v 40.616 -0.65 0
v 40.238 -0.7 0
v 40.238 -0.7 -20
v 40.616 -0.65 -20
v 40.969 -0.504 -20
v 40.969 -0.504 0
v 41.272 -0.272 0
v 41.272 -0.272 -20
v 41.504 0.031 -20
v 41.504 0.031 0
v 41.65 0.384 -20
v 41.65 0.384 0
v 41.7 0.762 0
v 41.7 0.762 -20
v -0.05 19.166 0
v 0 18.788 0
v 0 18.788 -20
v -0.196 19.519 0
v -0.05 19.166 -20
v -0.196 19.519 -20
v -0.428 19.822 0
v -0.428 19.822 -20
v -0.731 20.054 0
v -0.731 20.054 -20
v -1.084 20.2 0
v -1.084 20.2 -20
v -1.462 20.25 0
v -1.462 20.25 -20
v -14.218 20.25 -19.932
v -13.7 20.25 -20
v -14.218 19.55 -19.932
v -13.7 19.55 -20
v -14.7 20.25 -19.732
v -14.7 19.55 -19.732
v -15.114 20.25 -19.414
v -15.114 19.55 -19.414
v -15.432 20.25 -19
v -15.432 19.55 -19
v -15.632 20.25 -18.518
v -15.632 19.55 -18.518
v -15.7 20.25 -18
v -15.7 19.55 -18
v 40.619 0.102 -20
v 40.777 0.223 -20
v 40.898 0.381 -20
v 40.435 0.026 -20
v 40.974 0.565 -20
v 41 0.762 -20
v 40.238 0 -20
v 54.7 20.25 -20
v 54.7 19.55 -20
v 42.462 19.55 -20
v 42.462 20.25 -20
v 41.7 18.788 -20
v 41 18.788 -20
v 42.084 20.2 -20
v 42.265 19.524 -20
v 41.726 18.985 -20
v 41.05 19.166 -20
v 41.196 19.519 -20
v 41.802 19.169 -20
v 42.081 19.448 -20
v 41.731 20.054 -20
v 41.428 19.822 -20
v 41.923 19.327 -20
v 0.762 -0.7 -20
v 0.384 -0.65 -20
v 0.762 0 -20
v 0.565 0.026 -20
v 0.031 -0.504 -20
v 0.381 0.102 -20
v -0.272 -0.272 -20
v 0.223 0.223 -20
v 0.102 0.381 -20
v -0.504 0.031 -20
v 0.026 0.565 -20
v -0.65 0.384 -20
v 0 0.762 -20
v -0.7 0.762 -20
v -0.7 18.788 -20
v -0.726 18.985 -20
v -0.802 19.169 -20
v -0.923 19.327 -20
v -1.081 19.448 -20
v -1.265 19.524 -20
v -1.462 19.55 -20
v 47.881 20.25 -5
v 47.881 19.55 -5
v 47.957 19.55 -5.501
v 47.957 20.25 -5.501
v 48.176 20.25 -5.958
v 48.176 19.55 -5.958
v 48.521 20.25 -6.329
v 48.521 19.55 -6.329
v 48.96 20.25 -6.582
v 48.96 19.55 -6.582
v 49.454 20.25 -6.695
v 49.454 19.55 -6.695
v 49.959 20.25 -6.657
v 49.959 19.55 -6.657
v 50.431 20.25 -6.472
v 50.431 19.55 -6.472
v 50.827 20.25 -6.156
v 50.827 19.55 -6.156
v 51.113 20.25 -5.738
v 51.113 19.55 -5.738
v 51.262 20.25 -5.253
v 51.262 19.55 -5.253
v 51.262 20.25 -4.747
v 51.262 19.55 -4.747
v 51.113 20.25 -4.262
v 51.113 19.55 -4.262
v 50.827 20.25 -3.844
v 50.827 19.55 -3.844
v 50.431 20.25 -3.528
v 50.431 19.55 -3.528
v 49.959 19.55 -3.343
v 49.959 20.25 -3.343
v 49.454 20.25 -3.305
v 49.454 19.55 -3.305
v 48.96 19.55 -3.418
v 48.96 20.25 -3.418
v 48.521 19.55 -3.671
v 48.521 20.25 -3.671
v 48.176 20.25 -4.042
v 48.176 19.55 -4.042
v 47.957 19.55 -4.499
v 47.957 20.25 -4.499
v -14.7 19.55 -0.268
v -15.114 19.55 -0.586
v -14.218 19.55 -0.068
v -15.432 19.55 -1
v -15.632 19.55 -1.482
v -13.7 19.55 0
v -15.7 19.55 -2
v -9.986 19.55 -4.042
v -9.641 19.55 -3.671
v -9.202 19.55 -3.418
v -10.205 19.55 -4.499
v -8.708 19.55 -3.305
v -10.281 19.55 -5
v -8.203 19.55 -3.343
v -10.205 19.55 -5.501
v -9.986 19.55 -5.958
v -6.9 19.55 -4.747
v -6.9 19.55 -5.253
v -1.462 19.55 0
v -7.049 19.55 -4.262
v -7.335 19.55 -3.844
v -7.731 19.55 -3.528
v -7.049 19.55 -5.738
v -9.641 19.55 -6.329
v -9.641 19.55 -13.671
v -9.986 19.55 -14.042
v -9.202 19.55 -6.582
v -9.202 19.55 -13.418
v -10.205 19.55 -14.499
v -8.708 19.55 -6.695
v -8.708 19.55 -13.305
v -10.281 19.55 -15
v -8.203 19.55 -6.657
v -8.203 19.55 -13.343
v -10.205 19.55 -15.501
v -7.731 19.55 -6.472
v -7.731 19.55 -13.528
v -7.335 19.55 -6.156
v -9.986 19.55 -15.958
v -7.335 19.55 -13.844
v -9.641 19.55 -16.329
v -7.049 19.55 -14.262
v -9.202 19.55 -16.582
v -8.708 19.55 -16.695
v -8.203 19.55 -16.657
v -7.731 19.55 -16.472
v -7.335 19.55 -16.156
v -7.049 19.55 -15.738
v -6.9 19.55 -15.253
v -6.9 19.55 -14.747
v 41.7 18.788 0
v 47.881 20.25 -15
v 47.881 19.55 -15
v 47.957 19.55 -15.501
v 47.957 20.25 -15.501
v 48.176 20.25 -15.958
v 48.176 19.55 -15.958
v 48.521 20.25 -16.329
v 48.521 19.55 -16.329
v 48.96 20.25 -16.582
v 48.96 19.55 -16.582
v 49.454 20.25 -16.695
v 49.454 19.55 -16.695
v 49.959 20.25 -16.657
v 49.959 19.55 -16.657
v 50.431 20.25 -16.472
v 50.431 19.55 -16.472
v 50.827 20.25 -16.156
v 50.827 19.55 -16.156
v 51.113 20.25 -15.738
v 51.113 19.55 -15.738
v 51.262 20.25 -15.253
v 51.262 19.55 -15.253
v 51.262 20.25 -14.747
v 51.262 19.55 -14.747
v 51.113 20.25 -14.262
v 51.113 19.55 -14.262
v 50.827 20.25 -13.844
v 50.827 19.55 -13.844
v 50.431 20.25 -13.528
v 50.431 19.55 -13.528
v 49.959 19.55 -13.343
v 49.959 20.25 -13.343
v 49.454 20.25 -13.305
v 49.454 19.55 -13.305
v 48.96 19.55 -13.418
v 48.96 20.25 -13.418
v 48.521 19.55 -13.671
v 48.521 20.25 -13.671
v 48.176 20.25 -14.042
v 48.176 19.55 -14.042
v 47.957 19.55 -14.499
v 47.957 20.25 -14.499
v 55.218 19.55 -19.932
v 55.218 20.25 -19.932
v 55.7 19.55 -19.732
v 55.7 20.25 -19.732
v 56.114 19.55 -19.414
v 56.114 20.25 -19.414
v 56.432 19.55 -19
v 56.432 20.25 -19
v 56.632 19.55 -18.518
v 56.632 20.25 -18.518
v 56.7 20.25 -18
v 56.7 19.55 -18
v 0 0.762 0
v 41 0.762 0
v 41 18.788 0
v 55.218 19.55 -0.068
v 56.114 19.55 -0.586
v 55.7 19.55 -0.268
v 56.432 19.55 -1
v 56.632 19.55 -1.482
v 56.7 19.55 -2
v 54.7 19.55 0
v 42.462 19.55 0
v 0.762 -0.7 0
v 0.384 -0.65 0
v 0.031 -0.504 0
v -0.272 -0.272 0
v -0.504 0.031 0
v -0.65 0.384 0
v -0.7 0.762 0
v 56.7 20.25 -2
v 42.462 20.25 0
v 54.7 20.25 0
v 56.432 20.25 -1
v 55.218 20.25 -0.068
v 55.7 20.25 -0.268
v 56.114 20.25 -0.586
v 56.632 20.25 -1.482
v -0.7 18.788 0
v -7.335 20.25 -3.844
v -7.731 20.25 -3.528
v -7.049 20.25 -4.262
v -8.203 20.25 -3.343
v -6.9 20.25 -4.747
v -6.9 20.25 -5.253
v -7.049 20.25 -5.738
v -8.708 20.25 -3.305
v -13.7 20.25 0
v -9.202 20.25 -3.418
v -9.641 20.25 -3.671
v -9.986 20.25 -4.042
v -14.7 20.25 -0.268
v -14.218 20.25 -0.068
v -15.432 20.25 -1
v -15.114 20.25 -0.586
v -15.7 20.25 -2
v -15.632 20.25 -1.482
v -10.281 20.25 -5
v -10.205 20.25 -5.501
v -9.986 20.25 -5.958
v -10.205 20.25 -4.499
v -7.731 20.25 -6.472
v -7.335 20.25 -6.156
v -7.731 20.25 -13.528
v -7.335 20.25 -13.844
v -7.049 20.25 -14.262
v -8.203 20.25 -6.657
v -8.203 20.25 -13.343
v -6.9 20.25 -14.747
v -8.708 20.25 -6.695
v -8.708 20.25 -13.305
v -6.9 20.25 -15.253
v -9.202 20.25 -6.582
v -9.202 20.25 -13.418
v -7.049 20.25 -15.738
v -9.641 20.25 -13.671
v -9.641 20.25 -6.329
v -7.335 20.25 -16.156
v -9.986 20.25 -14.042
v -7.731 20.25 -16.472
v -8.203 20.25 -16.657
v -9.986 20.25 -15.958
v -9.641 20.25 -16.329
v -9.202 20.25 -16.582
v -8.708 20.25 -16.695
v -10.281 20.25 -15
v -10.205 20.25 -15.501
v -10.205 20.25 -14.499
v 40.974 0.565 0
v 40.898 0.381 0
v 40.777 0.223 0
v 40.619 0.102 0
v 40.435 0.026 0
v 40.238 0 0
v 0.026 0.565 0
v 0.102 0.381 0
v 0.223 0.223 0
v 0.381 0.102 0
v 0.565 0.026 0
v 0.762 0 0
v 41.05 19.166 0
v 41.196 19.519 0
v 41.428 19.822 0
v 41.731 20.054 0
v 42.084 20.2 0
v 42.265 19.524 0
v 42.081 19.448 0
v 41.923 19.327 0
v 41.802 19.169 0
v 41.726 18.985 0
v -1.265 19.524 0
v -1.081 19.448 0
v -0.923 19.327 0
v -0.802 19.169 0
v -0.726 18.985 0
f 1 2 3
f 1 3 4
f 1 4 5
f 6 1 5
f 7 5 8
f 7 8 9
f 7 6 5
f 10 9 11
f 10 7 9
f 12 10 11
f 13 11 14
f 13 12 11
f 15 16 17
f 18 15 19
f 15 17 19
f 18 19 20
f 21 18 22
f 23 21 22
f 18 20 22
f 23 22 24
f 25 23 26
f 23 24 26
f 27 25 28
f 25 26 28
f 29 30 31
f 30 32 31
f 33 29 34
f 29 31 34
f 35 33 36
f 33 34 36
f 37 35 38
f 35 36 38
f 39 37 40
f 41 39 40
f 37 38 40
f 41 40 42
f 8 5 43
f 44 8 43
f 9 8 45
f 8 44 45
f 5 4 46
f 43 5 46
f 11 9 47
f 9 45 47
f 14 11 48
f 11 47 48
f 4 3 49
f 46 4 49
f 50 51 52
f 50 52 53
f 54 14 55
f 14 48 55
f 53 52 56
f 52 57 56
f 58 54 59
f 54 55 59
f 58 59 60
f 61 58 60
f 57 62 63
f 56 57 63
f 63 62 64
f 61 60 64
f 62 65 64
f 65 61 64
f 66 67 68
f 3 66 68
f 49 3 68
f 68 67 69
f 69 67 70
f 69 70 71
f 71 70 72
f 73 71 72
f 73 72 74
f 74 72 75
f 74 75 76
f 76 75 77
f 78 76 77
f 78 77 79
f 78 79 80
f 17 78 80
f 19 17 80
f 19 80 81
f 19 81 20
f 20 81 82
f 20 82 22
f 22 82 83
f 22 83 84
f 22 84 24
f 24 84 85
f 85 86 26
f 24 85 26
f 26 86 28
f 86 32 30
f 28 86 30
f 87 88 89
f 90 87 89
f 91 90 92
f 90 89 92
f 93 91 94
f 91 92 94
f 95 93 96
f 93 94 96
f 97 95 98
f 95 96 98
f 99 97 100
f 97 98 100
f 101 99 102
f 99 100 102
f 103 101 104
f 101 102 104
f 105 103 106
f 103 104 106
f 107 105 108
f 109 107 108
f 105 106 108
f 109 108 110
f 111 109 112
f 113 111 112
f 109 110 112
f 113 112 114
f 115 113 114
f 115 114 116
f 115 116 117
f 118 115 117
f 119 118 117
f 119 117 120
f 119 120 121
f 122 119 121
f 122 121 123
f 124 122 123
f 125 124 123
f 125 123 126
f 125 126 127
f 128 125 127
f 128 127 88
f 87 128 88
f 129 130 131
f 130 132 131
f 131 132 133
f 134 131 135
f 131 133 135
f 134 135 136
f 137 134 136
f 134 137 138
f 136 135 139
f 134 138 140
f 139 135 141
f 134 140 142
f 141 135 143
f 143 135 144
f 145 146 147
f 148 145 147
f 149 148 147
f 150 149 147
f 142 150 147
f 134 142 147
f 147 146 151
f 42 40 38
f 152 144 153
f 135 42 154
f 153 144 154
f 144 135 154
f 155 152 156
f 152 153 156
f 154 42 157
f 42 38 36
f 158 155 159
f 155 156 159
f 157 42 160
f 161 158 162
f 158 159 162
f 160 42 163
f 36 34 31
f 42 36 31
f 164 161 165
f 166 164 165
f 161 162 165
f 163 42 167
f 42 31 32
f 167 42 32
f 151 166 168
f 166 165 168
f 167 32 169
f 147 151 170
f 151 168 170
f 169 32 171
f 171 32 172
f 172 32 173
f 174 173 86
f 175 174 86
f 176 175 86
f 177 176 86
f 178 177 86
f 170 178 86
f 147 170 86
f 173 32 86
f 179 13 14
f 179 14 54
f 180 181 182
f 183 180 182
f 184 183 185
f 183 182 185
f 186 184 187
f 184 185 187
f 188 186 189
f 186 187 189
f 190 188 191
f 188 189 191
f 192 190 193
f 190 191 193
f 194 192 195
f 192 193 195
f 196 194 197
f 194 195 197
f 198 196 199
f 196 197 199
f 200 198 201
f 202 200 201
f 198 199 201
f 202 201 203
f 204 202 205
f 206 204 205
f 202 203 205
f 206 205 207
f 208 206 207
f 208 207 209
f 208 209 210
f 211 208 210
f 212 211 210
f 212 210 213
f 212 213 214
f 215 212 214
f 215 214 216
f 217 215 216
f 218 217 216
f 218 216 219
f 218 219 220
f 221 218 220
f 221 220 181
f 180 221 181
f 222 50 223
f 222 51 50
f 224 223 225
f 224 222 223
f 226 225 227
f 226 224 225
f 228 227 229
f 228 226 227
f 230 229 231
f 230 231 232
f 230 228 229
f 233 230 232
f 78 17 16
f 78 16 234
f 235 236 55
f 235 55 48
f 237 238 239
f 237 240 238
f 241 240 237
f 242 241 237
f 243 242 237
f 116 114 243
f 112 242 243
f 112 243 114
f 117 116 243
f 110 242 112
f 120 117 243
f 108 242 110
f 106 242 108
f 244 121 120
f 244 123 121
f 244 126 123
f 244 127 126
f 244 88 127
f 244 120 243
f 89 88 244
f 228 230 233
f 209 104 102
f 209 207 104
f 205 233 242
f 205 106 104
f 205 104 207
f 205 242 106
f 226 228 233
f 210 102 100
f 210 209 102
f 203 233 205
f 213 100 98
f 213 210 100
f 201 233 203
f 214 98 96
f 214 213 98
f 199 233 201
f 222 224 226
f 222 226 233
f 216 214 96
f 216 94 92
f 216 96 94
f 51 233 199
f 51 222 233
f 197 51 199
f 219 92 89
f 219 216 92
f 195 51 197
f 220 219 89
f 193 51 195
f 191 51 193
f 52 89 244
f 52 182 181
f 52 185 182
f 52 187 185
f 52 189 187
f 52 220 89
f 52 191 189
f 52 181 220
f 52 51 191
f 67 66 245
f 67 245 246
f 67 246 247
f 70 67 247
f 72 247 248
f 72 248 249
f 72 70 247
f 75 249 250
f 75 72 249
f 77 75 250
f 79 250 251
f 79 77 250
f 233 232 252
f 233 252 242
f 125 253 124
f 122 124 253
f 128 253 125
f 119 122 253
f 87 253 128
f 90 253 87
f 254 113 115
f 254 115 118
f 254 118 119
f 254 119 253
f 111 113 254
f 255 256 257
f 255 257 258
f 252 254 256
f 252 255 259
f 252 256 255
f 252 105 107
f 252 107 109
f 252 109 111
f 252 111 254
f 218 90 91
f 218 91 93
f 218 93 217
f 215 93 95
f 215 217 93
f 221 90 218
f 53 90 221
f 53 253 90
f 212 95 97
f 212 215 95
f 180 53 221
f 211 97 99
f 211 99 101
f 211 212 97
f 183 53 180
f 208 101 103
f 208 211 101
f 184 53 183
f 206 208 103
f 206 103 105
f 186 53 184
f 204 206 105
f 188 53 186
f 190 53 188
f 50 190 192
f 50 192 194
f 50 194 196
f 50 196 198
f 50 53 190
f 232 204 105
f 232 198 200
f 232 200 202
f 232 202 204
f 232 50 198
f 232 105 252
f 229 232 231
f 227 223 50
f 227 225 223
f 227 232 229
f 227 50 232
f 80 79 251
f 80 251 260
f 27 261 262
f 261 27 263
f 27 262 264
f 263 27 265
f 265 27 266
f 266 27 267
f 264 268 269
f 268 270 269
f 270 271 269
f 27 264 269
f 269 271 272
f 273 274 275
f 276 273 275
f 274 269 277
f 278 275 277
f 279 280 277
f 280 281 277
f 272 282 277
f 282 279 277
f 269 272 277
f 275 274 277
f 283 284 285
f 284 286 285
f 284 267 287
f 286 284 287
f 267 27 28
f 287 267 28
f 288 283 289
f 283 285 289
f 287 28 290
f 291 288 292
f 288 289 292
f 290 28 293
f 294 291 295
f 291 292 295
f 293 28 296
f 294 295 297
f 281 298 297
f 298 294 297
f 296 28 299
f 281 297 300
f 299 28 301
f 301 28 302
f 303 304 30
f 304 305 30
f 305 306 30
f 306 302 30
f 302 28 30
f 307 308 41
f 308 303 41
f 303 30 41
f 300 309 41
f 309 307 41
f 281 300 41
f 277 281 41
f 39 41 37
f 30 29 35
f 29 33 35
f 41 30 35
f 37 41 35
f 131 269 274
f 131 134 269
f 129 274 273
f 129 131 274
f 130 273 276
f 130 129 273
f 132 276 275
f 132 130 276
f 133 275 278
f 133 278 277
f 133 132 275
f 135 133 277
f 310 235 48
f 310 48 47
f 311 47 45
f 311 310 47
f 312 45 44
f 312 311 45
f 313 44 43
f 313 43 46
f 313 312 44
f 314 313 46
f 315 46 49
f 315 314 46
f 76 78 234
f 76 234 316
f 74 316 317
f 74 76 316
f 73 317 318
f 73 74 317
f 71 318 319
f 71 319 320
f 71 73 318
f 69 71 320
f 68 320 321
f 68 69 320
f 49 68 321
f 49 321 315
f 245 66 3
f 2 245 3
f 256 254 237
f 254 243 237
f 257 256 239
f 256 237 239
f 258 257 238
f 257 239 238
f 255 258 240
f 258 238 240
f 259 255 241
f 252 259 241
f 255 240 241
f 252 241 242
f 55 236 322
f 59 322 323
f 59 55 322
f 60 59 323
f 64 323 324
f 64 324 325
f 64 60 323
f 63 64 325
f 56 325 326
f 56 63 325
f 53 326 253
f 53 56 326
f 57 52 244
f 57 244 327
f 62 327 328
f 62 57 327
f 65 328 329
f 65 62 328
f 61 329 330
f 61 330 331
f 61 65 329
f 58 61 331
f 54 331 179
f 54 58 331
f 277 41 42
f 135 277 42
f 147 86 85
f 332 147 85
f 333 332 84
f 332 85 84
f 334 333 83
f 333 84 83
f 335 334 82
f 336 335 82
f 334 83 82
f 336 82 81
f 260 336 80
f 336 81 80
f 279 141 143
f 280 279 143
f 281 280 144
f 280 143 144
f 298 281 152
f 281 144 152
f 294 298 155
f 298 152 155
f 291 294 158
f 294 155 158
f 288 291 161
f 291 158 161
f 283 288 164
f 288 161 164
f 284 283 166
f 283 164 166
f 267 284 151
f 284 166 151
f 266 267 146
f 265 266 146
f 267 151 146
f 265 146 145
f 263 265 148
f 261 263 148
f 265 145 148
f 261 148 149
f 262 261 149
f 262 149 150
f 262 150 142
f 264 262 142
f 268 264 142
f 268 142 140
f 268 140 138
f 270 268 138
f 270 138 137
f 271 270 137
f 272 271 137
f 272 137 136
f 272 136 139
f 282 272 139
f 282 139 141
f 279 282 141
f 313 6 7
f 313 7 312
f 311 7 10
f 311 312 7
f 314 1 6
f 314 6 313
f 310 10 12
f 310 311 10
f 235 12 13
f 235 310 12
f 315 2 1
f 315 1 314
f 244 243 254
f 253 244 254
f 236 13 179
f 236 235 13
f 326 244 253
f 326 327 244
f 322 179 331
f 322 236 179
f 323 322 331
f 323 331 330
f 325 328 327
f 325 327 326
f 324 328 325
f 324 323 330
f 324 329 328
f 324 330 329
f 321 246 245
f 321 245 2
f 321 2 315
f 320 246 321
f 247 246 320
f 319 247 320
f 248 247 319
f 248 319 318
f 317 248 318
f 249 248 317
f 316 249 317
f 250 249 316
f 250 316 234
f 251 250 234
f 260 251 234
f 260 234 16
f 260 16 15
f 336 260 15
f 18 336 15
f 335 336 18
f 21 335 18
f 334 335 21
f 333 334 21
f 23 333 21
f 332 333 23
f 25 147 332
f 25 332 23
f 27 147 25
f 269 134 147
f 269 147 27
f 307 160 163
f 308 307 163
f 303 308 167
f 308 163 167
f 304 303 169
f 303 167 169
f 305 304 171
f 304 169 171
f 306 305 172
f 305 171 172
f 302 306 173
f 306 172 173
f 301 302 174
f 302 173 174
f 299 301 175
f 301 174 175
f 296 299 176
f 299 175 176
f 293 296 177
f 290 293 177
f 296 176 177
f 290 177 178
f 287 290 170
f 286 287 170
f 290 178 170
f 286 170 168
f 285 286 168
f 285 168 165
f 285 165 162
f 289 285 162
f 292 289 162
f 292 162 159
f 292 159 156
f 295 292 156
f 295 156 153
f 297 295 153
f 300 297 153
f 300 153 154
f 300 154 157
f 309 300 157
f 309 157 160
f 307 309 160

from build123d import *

# Parameters (mm, degrees)
SKETCH1_W                    = 41
SKETCH1_H                    = 20
BASE_FLANGE1_DEPTH           = 0.7
EDGE_FLANGE1_STRIP_W         = 4.324
EDGE_FLANGE1_STRIP_H         = 0.7
EDGE_FLANGE1_STRIP_CUT_DEPTH = 20
EDGE_FLANGE1_DEPTH           = 20
EDGE_FLANGE2_STRIP_W         = 4.324
EDGE_FLANGE2_STRIP_H         = 0.7
EDGE_FLANGE2_STRIP_CUT_DEPTH = 20
EDGE_FLANGE2_DEPTH           = 20
EDGE_FLANGE3_STRIP_W         = 4.324
EDGE_FLANGE3_STRIP_H         = 0.7
EDGE_FLANGE3_STRIP_CUT_DEPTH = 20
EDGE_FLANGE3_DEPTH           = 20
M3_CLEARANCE_HOLE1_D         = 3.4
M3_CLEARANCE_HOLE1_DEPTH     = 3
M3_CLEARANCE_HOLE1_TIP       = 1.021463052
FILLET1_R                    = 2


# Sheet-metal steps are written as plain solids
with BuildPart() as part:
    # Sketch1 → Base-Flange1 (new body)
    with BuildSketch(Plane(origin=(0, 0, 0), x_dir=(1, 0, 0), z_dir=(0, 1, 0))):
        with Locations((20.5, 10)):
            Rectangle(SKETCH1_W, SKETCH1_H)
    extrude(amount=-BASE_FLANGE1_DEPTH)

    # Edge-Flange1 strip (across the edge) → Edge-Flange1 strip cut (cut)
    with BuildSketch(Plane(origin=(41, 0, 0), x_dir=(-1, 0, 0), z_dir=(0, 0, -1))):
        with Locations((-1.4, -0.35)):
            Rectangle(EDGE_FLANGE1_STRIP_W, EDGE_FLANGE1_STRIP_H)
    extrude(amount=EDGE_FLANGE1_STRIP_CUT_DEPTH, mode=Mode.SUBTRACT)

    # Edge-Flange1 section (across the edge) → Edge-Flange1 (add)
    with BuildSketch(Plane(origin=(41, 0, 0), x_dir=(-1, 0, 0), z_dir=(0, 0, -1))):
        with BuildLine():
            Line((-0.7, 0.762), (-0.7, 20.25))
            Line((-0.7, 20.25), (0, 20.25))
            Line((0, 20.25), (0, 0.762))
            ThreePointArc((0, 0.762), (0.223184633, 0.223184633), (0.762, 0))
            Line((0.762, 0), (0.762, -0.7))
            ThreePointArc((0.762, -0.7), (-0.271790114, -0.271790114), (-0.7, 0.762))
        make_face()
    extrude(amount=EDGE_FLANGE1_DEPTH)

    # Edge-Flange2 strip (across the edge) → Edge-Flange2 strip cut (cut)
    with BuildSketch(Plane(origin=(41.7, 20.25, -20), x_dir=(0, -1, 0), z_dir=(0, 0, 1))):
        with Locations((-0.7, -0.35)):
            Rectangle(EDGE_FLANGE2_STRIP_W, EDGE_FLANGE2_STRIP_H)
    edge_flange2_strip_cut = extrude(amount=EDGE_FLANGE2_STRIP_CUT_DEPTH, mode=Mode.SUBTRACT)

    # Edge-Flange2 section (across the edge) → Edge-Flange2 (add)
    with BuildSketch(Plane(origin=(41.7, 20.25, -20), x_dir=(0, -1, 0), z_dir=(0, 0, 1))):
        with BuildLine():
            Line((0, 0.762), (0, 15))
            Line((0, 15), (0.7, 15))
            Line((0.7, 15), (0.7, 0.762))
            ThreePointArc((0.7, 0.762), (0.923184633, 0.223184633), (1.462, 0))
            Line((1.462, 0), (1.462, -0.7))
            ThreePointArc((1.462, -0.7), (0.428209886, -0.271790114), (0, 0.762))
        make_face()
    edge_flange2 = extrude(amount=EDGE_FLANGE2_DEPTH)

    # Edge-Flange3 strip (across the edge) → Edge-Flange3 strip cut (cut)
    with BuildSketch(Plane.XY.offset(-20)):
        with Locations((-1.4, -0.35)):
            Rectangle(EDGE_FLANGE3_STRIP_W, EDGE_FLANGE3_STRIP_H)
    extrude(amount=EDGE_FLANGE3_STRIP_CUT_DEPTH, mode=Mode.SUBTRACT)

    # Edge-Flange3 section (across the edge) → Edge-Flange3 (add)
    with BuildSketch(Plane.XY.offset(-20)):
        with BuildLine():
            Line((-0.7, 0.762), (-0.7, 20.25))
            Line((-0.7, 20.25), (0, 20.25))
            Line((0, 20.25), (0, 0.762))
            ThreePointArc((0, 0.762), (0.223184633, 0.223184633), (0.762, 0))
            Line((0.762, 0), (0.762, -0.7))
            ThreePointArc((0.762, -0.7), (-0.271790114, -0.271790114), (-0.7, 0.762))
        make_face()
    extrude(amount=EDGE_FLANGE3_DEPTH)

    # Mirror2: Edge-Flange2 strip cut, Edge-Flange2 across plane
    add(edge_flange2_strip_cut.mirror(Plane(origin=(20.5, 0, 0), x_dir=(0, 0, 1), z_dir=(1, 0, 0))), mode=Mode.SUBTRACT)
    add(edge_flange2.mirror(Plane(origin=(20.5, 0, 0), x_dir=(0, 0, 1), z_dir=(1, 0, 0))))

    # M3 Clearance Hole1
    with Locations(Plane(origin=(0, 20.25, 0), x_dir=(1, 0, 0), z_dir=(0, 1, 0))):
        with Locations((49.581, 5), (49.581, 15), (-8.581, 15), (-8.581, 5)):
            Hole(M3_CLEARANCE_HOLE1_D / 2, depth=M3_CLEARANCE_HOLE1_DEPTH)
            with Locations((0, 0, -(M3_CLEARANCE_HOLE1_DEPTH + M3_CLEARANCE_HOLE1_TIP / 2))):  # 118° drill point
                Cone(0, M3_CLEARANCE_HOLE1_D / 2, M3_CLEARANCE_HOLE1_TIP, mode=Mode.SUBTRACT)

    # Fillet1
    fillet1_edges = [part.edges().sort_by_distance(p)[0] for p in [
        (-15.7, 19.9, 0),
        (-15.7, 19.9, -20),
        (56.7, 19.9, -20),
        (56.7, 19.9, 0),
    ]]
    fillet(fillet1_edges, radius=FILLET1_R)


solid = part.part
